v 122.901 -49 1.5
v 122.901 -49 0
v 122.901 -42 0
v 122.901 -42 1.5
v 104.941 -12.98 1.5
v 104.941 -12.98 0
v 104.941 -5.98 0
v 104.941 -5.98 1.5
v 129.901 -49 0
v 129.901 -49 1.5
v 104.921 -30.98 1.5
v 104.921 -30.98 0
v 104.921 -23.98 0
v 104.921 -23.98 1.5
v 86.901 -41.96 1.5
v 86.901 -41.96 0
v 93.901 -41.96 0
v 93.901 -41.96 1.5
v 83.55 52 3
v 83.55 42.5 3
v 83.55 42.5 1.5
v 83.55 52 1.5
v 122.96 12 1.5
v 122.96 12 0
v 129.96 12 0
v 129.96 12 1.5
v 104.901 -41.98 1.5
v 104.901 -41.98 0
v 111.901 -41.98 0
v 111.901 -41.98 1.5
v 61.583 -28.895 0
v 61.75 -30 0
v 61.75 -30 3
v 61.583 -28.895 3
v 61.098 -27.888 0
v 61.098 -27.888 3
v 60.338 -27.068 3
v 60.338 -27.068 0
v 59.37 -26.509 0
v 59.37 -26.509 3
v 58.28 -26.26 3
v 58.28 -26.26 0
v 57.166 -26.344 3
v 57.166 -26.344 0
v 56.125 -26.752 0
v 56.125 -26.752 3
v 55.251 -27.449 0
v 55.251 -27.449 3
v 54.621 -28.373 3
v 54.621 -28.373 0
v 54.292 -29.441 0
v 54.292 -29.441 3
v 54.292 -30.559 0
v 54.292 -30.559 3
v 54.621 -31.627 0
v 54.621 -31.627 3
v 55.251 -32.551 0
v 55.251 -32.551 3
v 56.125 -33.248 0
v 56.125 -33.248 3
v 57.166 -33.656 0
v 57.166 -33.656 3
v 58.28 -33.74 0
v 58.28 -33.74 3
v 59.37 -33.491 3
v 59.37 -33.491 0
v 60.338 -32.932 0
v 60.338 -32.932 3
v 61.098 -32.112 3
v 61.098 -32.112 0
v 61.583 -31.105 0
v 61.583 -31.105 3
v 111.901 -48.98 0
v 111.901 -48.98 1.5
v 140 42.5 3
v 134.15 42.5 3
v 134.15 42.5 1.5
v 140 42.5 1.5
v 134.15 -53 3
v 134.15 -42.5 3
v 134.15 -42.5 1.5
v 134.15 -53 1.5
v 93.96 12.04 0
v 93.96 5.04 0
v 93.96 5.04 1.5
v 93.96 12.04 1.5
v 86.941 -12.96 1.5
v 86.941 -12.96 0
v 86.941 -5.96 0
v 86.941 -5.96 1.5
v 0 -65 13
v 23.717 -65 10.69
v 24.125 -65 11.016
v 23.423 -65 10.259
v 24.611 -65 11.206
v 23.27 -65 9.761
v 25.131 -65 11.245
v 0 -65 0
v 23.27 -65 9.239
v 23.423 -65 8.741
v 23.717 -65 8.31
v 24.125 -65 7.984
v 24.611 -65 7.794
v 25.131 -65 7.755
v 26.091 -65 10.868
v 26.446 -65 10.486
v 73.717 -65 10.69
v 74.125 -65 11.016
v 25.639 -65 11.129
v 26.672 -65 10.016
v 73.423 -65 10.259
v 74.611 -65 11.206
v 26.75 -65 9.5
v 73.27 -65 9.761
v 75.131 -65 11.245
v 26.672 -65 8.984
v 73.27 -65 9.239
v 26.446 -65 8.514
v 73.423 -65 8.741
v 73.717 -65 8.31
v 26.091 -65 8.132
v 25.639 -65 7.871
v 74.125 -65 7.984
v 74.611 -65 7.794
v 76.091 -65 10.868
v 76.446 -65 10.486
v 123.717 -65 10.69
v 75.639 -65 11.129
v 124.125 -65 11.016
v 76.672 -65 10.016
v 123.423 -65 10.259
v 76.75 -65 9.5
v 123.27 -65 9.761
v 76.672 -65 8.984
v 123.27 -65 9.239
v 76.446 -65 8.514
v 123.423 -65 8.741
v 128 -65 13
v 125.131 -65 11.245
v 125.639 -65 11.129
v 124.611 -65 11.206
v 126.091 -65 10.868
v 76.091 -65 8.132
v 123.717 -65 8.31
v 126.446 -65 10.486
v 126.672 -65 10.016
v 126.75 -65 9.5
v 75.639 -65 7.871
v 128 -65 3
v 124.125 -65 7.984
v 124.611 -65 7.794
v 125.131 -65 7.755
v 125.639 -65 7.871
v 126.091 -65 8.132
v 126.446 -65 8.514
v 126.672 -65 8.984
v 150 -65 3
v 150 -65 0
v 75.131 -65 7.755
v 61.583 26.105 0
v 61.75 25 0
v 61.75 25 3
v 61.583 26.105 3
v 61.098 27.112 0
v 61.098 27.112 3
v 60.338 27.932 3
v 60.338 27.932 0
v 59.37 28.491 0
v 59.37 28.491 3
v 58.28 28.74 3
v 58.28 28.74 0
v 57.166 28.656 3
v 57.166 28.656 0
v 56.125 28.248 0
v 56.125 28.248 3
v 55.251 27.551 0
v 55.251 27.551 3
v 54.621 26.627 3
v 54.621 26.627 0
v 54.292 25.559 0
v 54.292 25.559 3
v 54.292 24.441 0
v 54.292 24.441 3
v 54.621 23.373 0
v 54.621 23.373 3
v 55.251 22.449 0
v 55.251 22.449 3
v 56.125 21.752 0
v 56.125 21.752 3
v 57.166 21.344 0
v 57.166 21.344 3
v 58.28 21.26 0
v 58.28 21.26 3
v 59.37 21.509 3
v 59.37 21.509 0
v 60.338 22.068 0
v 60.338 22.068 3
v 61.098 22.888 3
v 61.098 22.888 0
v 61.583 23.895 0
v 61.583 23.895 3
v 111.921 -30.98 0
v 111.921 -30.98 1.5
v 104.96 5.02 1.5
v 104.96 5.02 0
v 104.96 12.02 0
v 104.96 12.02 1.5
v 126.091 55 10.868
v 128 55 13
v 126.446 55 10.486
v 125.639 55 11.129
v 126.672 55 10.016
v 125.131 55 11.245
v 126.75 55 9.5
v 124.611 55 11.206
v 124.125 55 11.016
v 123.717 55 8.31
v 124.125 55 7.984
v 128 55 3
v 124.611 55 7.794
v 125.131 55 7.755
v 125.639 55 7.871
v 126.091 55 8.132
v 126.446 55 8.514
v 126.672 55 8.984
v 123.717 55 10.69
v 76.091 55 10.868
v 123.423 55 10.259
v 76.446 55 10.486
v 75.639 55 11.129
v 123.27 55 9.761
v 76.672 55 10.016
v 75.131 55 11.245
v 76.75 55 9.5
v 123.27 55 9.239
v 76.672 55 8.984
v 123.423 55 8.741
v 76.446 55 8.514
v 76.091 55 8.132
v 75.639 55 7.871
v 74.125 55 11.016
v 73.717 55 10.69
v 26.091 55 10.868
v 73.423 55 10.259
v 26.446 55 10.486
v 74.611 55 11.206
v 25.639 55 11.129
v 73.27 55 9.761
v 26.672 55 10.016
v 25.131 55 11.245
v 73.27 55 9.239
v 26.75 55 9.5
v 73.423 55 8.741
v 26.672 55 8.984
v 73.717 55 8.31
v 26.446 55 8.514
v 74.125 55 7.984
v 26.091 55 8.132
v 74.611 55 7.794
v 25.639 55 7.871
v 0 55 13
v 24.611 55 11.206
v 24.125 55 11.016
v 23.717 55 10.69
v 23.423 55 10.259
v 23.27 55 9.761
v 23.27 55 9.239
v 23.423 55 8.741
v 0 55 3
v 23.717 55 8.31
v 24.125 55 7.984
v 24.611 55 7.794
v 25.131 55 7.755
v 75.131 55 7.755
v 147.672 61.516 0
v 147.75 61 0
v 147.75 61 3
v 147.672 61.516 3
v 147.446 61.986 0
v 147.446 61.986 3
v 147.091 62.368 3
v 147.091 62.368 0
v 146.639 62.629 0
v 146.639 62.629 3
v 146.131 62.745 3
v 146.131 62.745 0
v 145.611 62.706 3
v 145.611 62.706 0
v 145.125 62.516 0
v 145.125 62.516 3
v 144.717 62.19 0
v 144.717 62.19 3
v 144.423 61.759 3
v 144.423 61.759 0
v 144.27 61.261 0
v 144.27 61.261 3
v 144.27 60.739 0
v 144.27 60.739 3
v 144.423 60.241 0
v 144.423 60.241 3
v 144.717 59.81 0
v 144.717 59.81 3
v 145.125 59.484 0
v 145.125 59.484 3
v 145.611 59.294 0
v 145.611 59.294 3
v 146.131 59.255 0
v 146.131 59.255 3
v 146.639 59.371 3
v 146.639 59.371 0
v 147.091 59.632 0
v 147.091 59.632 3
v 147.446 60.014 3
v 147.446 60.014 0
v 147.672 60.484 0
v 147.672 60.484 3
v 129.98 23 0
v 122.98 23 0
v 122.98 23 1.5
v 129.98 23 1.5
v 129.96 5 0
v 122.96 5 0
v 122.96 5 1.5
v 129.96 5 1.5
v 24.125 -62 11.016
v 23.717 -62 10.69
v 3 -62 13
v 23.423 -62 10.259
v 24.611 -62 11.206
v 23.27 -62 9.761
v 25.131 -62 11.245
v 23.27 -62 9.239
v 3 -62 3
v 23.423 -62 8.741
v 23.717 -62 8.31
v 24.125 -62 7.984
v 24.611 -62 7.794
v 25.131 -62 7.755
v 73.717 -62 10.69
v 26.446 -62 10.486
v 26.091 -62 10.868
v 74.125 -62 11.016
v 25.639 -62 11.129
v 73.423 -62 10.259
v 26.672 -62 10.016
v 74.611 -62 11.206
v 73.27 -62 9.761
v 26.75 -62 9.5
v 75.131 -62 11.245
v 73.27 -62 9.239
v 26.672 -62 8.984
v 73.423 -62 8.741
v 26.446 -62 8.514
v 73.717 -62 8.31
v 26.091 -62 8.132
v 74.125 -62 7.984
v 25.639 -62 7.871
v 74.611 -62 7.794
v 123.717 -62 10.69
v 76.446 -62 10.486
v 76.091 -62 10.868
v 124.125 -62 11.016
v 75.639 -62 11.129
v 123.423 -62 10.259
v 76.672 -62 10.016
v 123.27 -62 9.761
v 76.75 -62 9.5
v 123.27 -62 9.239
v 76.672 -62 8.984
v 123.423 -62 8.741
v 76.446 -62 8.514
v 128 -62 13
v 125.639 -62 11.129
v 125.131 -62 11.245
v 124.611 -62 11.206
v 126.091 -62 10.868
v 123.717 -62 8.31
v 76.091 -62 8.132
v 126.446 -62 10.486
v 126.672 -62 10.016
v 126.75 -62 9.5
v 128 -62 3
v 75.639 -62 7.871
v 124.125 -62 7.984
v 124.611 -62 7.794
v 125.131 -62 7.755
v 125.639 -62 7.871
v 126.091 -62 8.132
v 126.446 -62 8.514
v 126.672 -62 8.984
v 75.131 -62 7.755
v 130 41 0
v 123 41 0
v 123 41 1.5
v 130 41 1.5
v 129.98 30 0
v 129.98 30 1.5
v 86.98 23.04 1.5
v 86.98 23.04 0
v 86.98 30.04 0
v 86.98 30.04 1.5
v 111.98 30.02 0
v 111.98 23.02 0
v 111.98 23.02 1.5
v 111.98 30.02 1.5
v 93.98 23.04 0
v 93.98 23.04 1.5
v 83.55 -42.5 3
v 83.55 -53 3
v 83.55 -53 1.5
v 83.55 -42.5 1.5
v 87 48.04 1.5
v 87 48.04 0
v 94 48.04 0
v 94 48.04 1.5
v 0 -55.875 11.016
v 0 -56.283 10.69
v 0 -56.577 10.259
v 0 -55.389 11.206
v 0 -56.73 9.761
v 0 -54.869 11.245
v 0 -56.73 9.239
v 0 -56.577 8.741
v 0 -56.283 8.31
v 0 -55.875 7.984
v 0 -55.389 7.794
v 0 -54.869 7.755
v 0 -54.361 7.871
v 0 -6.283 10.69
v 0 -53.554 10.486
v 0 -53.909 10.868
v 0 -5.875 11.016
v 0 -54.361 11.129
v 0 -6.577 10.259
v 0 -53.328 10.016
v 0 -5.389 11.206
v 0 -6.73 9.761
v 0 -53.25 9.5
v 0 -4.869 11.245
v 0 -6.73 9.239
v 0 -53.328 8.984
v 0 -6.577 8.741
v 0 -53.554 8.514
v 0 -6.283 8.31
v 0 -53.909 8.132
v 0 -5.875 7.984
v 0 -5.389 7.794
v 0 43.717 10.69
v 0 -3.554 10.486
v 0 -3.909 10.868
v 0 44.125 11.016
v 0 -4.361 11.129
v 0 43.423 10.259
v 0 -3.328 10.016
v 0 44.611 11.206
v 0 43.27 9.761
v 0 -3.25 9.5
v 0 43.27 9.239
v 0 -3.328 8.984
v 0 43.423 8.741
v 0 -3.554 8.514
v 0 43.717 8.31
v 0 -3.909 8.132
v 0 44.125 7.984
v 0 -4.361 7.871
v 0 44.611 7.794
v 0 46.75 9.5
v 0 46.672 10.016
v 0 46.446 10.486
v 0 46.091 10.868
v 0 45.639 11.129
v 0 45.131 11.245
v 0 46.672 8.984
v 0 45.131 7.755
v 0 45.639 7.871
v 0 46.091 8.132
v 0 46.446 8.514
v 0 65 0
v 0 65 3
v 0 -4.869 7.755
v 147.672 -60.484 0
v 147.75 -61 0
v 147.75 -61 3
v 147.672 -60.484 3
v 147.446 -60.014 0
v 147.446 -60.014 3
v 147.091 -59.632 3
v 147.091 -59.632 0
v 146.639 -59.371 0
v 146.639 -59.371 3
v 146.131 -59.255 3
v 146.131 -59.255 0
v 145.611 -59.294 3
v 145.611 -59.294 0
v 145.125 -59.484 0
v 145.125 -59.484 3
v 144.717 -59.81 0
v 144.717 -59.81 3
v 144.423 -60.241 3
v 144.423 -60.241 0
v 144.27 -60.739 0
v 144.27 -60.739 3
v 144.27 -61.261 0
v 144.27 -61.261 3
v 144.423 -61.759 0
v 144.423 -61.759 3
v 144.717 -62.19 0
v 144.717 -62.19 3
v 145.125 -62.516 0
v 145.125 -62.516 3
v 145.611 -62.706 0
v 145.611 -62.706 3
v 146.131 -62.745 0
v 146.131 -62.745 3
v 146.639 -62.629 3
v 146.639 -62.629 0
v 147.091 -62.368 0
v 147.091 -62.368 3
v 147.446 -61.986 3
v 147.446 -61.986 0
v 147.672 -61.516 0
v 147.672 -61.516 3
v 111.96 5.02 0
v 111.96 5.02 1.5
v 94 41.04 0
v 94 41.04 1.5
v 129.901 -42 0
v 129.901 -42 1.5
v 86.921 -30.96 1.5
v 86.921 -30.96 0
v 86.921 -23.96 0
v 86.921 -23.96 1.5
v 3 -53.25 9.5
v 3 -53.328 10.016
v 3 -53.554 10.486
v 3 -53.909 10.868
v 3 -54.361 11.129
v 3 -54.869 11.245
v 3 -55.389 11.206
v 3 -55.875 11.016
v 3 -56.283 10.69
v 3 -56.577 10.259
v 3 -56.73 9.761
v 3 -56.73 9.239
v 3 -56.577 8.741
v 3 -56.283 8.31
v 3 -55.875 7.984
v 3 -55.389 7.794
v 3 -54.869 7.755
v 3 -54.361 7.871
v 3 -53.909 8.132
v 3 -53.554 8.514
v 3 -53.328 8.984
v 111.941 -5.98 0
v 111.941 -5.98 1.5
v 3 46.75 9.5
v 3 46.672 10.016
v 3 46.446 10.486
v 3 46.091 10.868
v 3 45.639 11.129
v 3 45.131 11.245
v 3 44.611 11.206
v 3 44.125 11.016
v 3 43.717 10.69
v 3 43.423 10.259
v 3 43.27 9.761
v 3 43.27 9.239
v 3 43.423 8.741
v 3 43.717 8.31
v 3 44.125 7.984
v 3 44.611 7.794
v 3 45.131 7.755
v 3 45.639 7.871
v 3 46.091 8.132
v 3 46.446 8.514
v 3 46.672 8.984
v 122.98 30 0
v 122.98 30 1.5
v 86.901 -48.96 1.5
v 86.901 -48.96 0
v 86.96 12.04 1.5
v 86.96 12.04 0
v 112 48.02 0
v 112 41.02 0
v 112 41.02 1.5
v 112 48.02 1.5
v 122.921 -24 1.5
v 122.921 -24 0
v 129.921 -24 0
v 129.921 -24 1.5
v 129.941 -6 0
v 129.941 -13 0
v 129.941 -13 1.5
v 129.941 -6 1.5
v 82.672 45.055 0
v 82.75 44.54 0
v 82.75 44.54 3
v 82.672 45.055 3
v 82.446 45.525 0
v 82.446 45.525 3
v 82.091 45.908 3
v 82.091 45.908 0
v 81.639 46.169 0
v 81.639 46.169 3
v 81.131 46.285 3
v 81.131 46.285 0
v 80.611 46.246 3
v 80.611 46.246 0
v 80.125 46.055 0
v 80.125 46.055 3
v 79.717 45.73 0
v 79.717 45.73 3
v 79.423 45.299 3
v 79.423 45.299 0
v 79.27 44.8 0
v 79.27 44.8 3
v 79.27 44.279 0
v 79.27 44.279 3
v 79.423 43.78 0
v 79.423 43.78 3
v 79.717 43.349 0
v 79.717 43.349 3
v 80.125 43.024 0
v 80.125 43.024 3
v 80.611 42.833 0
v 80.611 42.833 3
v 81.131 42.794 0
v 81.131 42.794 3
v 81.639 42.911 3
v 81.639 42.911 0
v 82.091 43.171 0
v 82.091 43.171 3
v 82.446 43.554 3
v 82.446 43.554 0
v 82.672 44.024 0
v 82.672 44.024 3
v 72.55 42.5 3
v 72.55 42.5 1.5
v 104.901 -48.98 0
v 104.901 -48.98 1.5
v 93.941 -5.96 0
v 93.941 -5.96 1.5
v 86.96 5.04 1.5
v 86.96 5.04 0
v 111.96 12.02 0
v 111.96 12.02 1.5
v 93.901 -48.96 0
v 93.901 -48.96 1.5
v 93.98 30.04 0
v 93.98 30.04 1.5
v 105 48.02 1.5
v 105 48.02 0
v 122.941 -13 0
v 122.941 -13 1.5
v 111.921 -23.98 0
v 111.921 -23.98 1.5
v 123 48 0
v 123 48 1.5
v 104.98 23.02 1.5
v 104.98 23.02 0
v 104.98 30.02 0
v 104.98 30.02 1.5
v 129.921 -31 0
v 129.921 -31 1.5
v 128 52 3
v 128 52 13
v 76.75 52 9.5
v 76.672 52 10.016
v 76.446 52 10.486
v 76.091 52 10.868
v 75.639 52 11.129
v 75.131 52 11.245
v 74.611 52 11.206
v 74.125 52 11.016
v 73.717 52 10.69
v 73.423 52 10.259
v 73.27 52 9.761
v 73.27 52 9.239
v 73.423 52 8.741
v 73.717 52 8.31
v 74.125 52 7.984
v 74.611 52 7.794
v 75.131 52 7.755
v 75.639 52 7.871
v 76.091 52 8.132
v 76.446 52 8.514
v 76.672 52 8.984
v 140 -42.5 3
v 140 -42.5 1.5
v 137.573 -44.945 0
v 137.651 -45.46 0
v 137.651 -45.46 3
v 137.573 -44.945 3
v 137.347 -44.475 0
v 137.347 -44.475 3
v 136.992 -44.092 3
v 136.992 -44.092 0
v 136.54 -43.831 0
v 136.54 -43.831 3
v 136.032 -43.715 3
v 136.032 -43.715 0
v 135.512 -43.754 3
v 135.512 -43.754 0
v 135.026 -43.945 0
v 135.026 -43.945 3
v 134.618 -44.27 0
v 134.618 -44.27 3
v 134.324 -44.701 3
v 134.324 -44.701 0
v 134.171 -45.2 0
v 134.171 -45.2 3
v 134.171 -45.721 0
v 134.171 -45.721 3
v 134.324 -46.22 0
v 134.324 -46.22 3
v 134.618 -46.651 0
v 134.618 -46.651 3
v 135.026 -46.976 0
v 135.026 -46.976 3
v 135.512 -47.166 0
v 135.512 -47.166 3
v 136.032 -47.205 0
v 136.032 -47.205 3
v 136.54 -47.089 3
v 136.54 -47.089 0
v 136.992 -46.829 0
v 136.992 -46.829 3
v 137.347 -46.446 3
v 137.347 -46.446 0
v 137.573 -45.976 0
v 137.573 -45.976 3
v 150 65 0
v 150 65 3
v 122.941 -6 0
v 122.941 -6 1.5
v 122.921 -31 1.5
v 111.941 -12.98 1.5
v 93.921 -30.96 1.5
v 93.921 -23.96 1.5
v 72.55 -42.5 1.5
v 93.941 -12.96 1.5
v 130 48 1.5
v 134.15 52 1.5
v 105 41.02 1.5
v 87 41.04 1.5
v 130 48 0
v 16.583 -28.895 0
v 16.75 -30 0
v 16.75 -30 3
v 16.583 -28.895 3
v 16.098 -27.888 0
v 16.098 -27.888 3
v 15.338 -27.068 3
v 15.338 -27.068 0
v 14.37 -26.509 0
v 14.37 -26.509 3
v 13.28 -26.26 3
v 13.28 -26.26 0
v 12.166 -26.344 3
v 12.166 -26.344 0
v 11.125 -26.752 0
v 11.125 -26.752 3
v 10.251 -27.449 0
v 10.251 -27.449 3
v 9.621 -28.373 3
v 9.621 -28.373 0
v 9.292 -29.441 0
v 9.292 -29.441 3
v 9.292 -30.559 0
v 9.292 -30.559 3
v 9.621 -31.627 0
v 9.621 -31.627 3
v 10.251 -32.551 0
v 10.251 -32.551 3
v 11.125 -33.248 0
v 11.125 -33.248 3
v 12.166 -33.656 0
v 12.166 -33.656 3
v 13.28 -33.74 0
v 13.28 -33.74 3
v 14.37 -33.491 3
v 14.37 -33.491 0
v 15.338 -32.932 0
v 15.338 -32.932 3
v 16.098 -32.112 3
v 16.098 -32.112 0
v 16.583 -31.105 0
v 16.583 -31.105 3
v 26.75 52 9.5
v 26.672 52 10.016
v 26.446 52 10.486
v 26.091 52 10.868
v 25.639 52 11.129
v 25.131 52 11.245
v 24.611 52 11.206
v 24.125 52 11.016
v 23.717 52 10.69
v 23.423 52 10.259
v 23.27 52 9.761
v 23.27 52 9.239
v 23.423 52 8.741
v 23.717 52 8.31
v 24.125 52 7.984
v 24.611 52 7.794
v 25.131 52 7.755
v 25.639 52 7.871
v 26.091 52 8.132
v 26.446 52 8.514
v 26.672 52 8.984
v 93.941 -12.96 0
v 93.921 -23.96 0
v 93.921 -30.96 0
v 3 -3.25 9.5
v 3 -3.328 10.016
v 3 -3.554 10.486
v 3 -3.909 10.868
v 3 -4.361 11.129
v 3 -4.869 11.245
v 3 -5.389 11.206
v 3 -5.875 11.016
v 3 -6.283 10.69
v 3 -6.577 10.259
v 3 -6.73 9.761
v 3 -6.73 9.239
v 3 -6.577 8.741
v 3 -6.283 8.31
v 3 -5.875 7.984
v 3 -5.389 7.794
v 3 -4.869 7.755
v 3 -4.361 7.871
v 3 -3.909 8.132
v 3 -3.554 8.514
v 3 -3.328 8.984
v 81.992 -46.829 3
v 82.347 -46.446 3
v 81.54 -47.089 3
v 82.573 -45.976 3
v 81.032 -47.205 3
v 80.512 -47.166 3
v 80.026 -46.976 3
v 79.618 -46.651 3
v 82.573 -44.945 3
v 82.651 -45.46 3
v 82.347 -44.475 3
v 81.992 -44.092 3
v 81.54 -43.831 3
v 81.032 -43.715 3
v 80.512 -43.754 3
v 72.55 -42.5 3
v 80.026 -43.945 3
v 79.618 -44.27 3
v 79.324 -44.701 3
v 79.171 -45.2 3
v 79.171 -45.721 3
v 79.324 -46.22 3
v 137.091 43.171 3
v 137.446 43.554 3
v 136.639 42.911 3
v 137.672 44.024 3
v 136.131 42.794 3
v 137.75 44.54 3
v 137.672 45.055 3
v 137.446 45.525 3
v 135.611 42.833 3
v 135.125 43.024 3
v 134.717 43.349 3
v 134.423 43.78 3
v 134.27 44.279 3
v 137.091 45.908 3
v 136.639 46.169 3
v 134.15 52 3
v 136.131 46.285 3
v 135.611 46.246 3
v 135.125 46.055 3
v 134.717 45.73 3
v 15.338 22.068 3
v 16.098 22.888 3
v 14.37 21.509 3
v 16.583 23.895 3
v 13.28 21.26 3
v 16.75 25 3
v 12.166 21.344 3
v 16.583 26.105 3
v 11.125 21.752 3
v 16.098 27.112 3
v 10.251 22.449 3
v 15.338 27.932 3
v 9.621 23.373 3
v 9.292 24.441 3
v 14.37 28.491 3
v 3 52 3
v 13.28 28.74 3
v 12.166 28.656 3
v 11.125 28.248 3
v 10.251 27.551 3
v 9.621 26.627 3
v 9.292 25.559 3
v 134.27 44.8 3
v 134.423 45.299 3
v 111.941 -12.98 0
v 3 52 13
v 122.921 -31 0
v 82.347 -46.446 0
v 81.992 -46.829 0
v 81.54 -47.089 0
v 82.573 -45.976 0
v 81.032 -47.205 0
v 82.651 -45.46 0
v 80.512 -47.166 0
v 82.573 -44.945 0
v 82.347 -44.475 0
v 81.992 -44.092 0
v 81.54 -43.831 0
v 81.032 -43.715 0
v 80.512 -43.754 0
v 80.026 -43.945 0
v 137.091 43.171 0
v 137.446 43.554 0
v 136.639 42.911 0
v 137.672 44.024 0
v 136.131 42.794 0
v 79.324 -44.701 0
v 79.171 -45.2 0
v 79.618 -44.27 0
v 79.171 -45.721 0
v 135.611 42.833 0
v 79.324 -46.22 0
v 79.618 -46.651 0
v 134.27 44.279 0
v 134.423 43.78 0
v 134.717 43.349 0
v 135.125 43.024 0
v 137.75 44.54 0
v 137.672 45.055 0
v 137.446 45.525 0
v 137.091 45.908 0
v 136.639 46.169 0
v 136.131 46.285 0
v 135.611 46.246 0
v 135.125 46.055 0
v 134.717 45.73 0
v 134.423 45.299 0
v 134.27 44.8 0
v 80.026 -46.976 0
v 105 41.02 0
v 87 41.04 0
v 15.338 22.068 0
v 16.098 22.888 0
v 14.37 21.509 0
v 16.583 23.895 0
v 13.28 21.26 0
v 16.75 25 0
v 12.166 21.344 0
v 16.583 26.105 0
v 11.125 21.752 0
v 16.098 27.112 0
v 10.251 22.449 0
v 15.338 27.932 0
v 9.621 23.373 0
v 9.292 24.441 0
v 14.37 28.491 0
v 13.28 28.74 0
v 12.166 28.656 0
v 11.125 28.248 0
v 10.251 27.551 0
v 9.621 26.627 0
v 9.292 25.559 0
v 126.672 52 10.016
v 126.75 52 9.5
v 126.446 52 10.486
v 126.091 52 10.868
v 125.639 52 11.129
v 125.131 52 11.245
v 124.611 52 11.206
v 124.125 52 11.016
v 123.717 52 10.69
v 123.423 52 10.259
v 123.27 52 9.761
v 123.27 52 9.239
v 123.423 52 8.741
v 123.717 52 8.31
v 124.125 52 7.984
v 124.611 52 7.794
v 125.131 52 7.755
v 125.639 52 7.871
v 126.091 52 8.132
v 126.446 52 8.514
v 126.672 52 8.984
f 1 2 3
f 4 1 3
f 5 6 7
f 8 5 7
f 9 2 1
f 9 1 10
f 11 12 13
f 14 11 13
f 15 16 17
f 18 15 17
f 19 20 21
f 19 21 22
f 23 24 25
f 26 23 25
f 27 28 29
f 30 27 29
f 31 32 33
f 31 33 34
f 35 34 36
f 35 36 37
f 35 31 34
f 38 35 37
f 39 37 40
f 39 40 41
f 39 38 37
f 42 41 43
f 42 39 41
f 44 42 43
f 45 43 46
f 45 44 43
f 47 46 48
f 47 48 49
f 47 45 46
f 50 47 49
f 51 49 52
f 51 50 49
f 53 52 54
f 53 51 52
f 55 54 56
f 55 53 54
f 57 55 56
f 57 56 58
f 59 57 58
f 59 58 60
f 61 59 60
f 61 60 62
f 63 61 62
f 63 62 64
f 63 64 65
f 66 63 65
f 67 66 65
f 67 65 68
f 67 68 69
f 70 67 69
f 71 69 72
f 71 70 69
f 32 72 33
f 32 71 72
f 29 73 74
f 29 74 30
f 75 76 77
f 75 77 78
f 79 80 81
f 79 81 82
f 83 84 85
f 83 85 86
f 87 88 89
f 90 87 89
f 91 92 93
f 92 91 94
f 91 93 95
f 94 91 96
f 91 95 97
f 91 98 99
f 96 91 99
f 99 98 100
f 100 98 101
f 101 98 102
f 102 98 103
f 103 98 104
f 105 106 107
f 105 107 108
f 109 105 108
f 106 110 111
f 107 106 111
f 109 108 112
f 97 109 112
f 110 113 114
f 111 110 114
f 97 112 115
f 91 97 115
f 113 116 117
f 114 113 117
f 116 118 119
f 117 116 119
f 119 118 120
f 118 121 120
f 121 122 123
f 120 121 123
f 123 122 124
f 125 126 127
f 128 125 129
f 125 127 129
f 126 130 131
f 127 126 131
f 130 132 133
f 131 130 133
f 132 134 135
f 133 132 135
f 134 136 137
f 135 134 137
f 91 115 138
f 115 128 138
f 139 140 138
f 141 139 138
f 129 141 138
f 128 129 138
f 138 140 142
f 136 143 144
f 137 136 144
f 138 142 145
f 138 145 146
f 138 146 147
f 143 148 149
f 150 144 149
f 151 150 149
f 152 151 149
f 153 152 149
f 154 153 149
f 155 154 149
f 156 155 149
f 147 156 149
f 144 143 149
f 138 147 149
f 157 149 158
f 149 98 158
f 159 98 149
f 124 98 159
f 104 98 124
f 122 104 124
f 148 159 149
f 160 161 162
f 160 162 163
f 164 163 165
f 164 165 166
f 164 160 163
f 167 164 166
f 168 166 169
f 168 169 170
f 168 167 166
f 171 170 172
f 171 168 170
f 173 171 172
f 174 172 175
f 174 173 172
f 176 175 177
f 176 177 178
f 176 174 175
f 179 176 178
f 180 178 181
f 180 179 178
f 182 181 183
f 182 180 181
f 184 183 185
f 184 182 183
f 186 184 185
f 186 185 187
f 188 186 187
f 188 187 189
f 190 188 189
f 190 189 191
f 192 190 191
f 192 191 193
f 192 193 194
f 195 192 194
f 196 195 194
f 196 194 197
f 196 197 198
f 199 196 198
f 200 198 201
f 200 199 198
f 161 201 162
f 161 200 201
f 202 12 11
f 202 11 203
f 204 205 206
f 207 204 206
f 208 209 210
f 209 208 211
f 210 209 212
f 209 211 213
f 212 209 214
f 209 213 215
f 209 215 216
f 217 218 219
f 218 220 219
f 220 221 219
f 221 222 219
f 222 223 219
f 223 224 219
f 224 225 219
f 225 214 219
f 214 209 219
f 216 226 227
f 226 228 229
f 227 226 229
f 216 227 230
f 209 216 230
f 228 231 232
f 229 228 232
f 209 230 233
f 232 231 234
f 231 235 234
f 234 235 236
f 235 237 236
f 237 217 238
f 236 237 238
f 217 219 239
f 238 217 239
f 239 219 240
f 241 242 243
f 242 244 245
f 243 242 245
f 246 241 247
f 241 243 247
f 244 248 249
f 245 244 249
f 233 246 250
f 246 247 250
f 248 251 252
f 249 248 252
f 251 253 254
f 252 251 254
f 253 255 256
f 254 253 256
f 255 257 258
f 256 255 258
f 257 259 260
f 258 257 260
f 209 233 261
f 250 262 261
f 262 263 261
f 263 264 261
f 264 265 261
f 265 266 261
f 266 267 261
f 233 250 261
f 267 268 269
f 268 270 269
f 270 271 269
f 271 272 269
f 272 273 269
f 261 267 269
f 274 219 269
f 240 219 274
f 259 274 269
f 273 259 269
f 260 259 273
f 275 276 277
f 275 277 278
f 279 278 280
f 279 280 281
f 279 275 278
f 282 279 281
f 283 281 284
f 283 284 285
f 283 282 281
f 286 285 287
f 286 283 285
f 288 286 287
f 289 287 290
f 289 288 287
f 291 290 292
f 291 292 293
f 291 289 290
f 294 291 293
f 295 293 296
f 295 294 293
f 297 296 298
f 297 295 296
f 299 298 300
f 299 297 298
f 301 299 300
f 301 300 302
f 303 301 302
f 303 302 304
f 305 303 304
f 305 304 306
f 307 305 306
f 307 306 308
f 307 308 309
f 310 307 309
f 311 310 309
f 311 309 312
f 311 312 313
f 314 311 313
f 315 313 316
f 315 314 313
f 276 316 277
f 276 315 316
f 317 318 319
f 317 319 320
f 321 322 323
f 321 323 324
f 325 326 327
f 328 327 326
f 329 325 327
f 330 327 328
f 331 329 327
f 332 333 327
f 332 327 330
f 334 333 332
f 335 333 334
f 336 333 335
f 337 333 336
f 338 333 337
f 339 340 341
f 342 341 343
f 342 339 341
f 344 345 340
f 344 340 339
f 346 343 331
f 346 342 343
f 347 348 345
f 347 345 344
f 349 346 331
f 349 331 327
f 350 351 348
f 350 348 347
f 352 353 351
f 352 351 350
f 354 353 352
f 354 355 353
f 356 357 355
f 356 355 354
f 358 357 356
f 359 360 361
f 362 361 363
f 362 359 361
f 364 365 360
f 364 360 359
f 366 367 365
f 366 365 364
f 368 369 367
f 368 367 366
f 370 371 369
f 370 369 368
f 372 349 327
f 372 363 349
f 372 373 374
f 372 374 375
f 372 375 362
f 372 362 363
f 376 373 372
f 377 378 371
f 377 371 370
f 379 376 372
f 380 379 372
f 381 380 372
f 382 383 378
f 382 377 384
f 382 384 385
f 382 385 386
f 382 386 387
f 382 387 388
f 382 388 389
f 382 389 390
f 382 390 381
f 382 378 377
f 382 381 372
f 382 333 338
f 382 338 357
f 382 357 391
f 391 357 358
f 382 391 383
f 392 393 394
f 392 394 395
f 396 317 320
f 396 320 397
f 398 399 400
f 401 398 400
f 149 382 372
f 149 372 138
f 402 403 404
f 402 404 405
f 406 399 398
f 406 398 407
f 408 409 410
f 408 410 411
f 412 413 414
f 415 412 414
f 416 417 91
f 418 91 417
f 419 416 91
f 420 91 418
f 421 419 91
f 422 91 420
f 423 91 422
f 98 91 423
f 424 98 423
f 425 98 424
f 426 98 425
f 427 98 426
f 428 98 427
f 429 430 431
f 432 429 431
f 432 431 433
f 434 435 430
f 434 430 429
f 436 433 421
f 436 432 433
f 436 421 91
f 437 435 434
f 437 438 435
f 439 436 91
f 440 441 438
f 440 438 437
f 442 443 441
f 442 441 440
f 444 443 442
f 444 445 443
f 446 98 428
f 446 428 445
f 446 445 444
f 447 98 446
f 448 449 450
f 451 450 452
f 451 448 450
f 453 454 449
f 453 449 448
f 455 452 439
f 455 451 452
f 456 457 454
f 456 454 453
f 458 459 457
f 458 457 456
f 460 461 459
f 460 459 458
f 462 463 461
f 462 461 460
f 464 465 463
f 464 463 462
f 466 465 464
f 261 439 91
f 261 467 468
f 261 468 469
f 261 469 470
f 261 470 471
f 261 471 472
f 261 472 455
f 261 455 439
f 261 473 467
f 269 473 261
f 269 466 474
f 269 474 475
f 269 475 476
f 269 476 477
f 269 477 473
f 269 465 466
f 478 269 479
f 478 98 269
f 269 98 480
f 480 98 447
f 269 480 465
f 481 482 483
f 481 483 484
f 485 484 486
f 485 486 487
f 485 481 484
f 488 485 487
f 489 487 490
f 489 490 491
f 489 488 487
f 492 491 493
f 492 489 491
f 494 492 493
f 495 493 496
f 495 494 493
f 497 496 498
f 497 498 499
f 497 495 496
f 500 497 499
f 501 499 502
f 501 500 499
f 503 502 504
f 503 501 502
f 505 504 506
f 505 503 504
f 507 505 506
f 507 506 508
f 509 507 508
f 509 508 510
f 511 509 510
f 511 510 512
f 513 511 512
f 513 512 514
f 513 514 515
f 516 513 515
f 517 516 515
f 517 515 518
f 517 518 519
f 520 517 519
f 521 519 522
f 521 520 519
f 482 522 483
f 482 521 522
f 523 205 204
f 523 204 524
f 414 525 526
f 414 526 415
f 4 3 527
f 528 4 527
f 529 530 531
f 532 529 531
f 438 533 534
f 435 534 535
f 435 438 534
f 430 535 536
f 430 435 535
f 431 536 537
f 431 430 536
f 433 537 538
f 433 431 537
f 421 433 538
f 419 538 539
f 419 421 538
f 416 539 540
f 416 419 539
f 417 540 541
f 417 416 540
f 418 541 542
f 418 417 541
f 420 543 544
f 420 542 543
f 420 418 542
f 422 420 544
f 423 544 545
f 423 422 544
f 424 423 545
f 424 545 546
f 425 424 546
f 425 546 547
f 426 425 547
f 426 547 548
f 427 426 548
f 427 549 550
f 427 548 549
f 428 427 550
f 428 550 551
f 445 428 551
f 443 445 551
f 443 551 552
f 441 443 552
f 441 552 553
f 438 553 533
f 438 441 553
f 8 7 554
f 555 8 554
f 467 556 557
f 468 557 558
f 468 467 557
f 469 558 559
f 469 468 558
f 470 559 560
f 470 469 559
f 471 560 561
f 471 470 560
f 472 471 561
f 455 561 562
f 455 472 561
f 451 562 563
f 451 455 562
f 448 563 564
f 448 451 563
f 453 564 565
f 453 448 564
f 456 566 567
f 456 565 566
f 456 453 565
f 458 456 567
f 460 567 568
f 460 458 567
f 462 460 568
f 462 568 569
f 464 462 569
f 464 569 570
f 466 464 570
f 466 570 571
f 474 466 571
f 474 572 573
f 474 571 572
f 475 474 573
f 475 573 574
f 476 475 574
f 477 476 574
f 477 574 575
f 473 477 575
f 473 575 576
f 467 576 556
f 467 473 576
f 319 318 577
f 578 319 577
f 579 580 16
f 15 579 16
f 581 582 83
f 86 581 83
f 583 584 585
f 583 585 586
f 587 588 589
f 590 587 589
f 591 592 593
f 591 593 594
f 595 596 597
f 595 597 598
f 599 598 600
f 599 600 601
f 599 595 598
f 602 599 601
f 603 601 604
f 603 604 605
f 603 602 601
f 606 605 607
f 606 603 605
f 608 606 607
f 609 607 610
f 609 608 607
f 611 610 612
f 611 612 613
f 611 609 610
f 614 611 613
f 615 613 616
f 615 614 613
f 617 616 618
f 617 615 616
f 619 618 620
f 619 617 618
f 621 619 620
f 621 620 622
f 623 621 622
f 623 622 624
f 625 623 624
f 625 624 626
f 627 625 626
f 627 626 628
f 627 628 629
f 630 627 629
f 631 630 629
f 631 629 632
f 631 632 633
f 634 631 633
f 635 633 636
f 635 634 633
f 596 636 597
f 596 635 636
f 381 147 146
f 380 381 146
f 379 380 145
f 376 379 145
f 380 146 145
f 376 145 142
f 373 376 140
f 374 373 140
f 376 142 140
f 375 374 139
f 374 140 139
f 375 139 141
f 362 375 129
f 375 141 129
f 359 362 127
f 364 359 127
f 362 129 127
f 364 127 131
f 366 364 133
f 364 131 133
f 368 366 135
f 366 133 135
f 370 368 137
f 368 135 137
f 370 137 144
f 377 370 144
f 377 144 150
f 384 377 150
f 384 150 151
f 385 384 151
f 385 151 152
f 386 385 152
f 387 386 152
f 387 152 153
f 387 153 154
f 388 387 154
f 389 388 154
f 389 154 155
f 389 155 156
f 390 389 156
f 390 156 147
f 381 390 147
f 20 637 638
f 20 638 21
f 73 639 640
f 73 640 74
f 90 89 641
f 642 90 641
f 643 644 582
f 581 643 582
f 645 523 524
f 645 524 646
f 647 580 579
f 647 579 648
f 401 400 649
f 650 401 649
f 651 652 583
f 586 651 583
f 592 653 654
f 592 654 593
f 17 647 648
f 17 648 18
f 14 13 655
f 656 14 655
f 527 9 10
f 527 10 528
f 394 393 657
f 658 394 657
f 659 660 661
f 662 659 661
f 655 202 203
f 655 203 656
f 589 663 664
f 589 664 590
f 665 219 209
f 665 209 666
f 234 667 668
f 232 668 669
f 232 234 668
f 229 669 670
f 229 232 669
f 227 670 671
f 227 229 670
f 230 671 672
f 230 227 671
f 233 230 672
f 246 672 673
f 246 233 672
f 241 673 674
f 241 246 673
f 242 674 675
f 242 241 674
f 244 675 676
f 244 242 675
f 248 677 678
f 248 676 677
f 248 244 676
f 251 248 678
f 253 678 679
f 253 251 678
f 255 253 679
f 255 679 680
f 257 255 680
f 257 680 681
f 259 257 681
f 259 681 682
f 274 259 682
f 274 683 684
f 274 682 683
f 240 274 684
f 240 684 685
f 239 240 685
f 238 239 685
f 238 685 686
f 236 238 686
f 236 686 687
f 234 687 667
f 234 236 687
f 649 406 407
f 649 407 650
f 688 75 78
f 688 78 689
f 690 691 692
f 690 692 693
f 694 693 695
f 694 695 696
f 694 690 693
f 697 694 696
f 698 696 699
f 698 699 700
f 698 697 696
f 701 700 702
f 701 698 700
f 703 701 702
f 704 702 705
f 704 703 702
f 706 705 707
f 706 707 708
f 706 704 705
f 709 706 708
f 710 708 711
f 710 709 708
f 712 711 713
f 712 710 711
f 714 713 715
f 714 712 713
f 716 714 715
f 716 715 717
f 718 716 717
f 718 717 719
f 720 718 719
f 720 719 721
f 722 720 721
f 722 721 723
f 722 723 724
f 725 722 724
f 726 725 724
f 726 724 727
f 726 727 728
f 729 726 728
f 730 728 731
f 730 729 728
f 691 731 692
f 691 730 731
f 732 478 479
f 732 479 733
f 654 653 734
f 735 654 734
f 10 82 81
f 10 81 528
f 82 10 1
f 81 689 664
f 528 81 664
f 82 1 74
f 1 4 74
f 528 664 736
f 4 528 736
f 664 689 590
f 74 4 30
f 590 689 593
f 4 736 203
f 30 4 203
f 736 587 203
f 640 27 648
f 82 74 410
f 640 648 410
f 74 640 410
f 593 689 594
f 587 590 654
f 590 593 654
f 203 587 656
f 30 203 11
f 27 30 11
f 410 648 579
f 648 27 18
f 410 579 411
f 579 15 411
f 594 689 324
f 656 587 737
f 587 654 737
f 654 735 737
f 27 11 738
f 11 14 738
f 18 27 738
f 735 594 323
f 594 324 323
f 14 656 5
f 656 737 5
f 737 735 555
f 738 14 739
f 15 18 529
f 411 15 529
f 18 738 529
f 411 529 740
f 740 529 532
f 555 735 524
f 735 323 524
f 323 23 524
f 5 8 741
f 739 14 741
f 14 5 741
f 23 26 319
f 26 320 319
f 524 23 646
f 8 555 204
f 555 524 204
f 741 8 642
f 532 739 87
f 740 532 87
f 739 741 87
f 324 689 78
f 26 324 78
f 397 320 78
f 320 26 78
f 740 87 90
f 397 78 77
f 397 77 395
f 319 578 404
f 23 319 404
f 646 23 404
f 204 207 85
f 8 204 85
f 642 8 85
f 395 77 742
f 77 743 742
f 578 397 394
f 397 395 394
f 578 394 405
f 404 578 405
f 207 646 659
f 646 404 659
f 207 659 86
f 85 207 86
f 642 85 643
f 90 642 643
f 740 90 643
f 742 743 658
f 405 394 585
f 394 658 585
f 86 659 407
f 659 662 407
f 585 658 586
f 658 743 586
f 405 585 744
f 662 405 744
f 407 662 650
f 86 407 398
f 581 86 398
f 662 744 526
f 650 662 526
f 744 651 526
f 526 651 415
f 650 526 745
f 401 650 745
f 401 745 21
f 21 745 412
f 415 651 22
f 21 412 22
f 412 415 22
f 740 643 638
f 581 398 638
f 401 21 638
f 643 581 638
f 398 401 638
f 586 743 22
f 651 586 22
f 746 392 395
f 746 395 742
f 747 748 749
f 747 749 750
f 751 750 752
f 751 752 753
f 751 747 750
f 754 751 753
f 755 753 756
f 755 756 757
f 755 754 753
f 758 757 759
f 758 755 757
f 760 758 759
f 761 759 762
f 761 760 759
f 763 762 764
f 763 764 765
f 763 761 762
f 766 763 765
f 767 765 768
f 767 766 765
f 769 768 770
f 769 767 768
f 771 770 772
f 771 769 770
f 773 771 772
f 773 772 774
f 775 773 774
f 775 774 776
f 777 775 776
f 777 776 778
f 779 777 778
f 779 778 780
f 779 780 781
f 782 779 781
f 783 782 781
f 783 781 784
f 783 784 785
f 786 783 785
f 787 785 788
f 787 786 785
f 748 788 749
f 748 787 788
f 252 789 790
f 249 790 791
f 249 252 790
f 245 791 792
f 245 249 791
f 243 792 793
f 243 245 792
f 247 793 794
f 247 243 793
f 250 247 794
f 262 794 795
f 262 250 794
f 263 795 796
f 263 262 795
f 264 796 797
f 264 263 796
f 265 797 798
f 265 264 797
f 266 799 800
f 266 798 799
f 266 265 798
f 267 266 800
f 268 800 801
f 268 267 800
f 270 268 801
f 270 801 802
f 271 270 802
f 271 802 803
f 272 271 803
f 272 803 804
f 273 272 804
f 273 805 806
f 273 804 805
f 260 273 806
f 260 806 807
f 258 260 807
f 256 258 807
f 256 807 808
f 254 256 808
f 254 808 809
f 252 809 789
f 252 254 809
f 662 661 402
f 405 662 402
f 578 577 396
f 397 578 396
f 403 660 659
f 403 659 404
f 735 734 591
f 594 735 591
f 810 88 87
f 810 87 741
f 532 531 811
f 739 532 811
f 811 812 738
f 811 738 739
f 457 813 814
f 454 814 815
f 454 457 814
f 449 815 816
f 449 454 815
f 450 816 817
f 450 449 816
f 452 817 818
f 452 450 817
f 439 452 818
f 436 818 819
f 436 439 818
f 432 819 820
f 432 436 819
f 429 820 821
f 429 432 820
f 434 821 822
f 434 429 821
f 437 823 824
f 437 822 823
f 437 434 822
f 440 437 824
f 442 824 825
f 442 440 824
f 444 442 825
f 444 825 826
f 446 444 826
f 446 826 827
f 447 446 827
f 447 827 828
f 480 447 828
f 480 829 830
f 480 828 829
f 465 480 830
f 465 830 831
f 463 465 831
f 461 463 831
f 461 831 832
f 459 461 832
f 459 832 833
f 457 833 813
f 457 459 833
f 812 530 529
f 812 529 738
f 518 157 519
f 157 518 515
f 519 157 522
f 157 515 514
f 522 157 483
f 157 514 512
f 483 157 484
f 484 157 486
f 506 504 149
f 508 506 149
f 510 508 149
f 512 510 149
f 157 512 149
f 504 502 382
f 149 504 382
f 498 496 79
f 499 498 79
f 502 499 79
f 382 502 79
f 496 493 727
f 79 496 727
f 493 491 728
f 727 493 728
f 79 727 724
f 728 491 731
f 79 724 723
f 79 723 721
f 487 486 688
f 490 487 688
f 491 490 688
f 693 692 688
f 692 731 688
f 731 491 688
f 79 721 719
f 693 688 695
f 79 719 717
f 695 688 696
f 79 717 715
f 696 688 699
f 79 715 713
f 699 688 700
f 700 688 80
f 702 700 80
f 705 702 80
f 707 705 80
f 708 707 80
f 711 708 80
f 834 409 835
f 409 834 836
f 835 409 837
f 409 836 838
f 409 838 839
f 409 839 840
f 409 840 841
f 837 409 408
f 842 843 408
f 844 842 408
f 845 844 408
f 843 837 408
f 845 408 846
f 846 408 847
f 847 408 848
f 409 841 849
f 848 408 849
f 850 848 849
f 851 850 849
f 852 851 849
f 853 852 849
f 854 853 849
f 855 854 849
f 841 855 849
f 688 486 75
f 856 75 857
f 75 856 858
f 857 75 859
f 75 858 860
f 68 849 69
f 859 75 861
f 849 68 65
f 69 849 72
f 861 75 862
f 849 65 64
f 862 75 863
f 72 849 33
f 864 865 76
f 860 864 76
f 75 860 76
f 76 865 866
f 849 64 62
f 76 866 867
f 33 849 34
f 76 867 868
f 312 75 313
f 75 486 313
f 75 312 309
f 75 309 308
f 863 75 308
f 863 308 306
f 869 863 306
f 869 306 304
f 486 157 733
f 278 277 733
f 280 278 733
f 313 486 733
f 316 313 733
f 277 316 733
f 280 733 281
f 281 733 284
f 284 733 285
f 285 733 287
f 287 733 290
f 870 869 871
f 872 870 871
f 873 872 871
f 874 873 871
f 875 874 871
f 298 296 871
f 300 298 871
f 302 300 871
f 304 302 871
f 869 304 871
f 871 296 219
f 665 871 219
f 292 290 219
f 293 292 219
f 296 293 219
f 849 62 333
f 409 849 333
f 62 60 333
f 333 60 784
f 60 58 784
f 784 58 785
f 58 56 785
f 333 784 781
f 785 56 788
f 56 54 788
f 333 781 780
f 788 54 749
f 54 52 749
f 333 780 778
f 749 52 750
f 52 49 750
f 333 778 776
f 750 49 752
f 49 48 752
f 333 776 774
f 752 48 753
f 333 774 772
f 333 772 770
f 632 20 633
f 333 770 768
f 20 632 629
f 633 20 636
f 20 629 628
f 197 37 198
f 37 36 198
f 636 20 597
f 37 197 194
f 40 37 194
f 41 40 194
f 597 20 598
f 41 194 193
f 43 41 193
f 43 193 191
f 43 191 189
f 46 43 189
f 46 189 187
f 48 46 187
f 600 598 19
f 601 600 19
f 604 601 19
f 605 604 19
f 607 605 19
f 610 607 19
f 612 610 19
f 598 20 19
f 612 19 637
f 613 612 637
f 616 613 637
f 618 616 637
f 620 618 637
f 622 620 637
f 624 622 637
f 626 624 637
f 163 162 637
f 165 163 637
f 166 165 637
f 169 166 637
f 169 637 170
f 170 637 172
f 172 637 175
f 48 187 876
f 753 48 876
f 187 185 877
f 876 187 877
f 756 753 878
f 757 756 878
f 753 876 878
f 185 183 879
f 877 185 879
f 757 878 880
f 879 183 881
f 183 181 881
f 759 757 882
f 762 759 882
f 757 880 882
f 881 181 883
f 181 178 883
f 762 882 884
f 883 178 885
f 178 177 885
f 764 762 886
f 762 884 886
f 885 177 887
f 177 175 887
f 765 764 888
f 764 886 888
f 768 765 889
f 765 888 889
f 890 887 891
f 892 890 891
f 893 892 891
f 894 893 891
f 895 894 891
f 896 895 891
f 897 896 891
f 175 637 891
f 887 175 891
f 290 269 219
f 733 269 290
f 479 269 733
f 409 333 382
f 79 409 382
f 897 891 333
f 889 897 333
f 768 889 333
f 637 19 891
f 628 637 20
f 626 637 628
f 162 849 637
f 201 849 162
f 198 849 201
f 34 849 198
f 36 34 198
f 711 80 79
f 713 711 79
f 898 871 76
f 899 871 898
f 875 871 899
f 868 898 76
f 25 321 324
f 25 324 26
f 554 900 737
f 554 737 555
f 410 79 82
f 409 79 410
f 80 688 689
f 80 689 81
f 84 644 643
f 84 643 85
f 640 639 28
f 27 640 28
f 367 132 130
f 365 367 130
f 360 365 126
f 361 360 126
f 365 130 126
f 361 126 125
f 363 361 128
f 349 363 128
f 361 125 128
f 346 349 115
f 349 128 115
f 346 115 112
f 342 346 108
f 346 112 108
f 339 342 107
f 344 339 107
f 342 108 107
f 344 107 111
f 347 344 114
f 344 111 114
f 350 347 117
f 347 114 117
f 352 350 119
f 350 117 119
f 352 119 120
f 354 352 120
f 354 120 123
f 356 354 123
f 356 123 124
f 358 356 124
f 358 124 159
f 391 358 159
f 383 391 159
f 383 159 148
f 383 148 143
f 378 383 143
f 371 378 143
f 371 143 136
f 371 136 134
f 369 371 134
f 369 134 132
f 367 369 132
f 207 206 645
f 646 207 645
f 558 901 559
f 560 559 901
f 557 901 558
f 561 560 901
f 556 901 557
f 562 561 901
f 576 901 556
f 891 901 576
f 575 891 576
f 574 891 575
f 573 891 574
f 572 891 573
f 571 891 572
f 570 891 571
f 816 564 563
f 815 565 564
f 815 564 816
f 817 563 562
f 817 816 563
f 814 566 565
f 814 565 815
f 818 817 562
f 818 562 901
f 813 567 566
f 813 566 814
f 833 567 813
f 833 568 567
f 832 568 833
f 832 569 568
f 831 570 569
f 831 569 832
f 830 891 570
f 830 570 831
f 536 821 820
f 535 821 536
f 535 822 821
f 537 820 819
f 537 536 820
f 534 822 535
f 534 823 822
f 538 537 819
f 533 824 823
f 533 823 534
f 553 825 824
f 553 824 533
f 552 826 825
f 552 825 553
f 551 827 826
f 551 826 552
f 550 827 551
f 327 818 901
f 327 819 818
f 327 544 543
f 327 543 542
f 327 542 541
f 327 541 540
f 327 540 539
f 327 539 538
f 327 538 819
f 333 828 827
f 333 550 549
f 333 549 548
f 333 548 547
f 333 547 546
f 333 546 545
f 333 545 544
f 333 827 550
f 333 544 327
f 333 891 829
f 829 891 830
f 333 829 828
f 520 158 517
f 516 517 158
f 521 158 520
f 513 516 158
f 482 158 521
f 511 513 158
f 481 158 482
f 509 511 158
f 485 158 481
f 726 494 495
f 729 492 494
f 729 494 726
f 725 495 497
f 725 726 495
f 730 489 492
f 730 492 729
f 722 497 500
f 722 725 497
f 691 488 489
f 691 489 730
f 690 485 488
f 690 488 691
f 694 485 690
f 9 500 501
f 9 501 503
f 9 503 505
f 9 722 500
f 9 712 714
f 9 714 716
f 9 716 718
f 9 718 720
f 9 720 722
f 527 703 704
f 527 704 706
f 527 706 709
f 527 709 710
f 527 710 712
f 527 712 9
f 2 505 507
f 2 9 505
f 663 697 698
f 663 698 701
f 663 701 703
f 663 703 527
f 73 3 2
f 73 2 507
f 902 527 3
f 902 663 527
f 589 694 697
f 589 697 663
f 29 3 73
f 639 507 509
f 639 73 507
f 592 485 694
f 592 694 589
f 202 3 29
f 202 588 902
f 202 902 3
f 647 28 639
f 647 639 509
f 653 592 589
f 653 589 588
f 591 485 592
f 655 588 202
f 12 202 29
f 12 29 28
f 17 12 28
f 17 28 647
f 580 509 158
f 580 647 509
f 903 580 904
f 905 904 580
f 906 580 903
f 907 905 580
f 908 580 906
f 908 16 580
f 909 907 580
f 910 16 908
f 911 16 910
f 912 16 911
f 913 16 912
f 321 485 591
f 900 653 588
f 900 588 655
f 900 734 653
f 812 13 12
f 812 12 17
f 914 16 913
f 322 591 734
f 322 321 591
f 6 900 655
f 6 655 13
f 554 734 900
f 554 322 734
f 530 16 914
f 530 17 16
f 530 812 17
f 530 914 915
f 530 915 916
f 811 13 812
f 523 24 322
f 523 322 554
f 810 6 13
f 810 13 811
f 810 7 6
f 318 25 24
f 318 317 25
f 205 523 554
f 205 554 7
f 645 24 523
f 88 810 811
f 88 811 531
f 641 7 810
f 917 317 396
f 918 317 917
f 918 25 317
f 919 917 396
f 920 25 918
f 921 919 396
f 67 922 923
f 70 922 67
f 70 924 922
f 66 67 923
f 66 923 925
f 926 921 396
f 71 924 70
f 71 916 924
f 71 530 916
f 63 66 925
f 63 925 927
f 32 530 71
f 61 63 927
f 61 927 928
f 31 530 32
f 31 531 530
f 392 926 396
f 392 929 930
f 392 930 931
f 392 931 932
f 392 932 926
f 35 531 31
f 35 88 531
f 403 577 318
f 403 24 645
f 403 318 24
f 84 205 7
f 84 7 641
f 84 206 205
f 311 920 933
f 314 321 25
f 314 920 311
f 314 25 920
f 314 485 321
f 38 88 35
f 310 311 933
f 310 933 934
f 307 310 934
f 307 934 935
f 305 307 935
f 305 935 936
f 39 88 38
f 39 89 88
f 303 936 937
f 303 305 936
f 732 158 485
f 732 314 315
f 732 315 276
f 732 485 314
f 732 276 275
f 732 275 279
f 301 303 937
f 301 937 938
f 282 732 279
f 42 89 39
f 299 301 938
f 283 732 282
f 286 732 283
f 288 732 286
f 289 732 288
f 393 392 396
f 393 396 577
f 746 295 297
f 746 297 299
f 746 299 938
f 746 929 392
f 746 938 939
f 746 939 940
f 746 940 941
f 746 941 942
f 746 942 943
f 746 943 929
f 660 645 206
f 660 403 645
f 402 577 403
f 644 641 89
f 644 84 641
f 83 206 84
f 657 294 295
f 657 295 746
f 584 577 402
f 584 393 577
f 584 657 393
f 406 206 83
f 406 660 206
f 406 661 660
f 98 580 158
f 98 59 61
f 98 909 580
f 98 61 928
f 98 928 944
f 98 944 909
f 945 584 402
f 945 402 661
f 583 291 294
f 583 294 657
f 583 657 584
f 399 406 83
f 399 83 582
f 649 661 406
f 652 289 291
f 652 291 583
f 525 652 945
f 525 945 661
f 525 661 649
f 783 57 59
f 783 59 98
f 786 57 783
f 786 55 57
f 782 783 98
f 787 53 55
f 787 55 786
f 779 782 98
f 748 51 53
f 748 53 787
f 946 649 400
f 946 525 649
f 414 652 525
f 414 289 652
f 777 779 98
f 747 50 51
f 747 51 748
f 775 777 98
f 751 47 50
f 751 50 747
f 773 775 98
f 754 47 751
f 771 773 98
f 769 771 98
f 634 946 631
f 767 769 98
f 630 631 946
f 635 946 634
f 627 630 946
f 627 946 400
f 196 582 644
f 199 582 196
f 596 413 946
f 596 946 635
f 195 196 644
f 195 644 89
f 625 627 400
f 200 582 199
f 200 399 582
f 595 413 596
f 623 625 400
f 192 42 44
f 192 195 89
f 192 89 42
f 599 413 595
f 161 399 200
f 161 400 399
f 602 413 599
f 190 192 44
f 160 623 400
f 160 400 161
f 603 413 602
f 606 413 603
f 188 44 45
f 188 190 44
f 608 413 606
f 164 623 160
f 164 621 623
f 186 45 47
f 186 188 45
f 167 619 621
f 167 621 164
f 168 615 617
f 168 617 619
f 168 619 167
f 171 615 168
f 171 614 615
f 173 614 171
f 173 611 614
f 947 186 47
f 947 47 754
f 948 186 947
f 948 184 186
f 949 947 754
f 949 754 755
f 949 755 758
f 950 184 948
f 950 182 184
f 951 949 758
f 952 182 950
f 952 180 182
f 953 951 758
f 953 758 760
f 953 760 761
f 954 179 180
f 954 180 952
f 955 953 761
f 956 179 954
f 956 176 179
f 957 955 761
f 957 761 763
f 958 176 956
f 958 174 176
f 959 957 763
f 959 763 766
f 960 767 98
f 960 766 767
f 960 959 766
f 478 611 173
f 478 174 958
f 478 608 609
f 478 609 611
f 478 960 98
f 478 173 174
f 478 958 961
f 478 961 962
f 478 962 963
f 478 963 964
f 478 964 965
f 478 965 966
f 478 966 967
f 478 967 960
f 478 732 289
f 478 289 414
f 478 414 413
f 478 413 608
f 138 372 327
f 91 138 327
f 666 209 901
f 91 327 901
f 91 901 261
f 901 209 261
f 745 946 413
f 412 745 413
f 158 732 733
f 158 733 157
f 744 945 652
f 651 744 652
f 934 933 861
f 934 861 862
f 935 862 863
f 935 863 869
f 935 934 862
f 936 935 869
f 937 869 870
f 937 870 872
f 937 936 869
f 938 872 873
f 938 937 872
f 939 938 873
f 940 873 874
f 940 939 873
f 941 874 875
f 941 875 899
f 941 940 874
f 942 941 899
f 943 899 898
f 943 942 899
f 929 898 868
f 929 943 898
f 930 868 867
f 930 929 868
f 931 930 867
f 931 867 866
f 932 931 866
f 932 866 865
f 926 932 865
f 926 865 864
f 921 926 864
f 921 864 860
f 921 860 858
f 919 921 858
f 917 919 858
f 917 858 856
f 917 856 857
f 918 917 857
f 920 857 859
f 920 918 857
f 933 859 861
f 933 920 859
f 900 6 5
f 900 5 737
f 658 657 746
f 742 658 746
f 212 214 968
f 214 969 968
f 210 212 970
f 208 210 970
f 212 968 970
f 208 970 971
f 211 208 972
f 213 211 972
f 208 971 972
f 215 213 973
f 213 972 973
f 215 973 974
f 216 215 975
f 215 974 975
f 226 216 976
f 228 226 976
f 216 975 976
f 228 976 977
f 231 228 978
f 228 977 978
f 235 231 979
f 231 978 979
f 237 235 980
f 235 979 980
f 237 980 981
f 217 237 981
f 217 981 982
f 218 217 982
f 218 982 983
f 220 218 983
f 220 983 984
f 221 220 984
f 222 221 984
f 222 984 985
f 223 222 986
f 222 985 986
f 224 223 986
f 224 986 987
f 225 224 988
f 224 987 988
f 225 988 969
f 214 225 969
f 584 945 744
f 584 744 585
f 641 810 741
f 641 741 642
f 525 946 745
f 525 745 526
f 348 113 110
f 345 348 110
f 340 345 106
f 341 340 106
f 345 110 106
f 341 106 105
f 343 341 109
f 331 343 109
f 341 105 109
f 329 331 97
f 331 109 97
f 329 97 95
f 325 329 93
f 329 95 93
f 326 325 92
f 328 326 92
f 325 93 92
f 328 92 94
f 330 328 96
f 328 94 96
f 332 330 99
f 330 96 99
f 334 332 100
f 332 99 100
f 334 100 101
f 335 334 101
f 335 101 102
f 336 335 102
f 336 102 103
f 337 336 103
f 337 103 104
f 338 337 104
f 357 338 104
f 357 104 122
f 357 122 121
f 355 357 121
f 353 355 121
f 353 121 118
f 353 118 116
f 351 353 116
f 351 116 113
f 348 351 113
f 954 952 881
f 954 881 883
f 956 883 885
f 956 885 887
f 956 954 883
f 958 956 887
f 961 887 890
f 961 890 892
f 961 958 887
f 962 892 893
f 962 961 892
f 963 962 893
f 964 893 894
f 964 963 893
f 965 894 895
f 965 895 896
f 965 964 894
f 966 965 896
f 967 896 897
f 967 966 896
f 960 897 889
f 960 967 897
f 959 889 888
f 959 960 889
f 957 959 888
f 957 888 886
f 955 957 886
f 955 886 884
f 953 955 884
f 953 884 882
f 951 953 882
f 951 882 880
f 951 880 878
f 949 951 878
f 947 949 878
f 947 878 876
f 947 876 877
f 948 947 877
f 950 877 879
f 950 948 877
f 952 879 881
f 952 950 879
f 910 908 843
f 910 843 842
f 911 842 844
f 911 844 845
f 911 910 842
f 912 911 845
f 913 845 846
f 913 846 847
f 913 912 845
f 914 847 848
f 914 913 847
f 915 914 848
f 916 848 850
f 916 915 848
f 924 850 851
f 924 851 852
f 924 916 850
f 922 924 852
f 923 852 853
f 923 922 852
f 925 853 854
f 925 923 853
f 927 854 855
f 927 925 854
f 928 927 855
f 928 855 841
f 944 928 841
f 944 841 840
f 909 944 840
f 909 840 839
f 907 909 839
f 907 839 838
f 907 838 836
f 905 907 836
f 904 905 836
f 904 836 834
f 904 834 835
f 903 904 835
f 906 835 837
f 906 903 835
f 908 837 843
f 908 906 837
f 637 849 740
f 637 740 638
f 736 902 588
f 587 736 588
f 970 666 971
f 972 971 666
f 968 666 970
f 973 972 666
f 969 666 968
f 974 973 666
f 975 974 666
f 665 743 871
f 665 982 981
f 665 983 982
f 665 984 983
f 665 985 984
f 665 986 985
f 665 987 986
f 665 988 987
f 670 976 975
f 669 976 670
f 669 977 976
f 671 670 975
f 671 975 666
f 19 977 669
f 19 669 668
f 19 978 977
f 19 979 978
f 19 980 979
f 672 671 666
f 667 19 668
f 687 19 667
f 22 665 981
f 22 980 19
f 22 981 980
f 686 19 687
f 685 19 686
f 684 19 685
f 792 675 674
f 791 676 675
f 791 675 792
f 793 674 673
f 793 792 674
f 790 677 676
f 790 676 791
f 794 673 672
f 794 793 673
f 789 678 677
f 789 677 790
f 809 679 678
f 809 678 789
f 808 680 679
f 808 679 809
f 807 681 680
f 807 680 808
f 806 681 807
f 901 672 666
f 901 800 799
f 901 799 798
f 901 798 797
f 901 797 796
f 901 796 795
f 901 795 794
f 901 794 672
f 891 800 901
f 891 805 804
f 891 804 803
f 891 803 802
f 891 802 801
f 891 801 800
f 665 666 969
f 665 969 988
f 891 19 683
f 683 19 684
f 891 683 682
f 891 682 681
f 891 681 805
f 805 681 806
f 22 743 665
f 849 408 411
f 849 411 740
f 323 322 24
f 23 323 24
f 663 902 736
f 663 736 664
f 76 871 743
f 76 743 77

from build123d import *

# Parameters (mm, degrees)
SKETCH013_R     = 3.75
SKETCH013_R_2   = 1.75
SKETCH013_W     = 7
SKETCH013_H     = 7
PAD004_DEPTH    = 3
PAD_DEPTH       = 10
SKETCH015_R     = 1.75
POCKET005_DEPTH = 5
SKETCH004_R     = 1.75
POCKET006_DEPTH = 5
SKETCH014_R     = 1.75
POCKET007_DEPTH = 5
POCKET_DEPTH    = 2


with BuildPart() as part:
    # Sketch013 → Pad004 (new body)
    with BuildSketch(Plane.XY):
        Polygon((0, 65), (150, 65.000002), (150, -65), (0, -65), align=None)
        with Locations((13, 25)):
            Circle(SKETCH013_R, mode=Mode.SUBTRACT)
        with Locations((58, 25)):
            Circle(SKETCH013_R, mode=Mode.SUBTRACT)
        with Locations((13, -30)):
            Circle(SKETCH013_R, mode=Mode.SUBTRACT)
        with Locations((58, -30)):
            Circle(SKETCH013_R, mode=Mode.SUBTRACT)
        with Locations((146, 61.000002)):
            Circle(SKETCH013_R_2, mode=Mode.SUBTRACT)
        with Locations((146, -61)):
            Circle(SKETCH013_R_2, mode=Mode.SUBTRACT)
        with Locations((81.000022, 44.539576)):
            Circle(SKETCH013_R_2, mode=Mode.SUBTRACT)
        with Locations((136, 44.539576)):
            Circle(SKETCH013_R_2, mode=Mode.SUBTRACT)
        with Locations((80.901087, -45.46037)):
            Circle(SKETCH013_R_2, mode=Mode.SUBTRACT)
        with Locations((135.901066, -45.46037)):
            Circle(SKETCH013_R_2, mode=Mode.SUBTRACT)
        with Locations((90.500022, 44.539576)):
            Rectangle(SKETCH013_W, SKETCH013_H, mode=Mode.SUBTRACT)
        with Locations((108.500011, 44.519789)):
            Rectangle(SKETCH013_W, SKETCH013_H, mode=Mode.SUBTRACT)
        with Locations((126.5, 44.500002)):
            Rectangle(SKETCH013_W, SKETCH013_H, mode=Mode.SUBTRACT)
        with Locations((90.480235, 26.539587)):
            Rectangle(SKETCH013_W, SKETCH013_H, mode=Mode.SUBTRACT)
        with Locations((108.480224, 26.5198)):
            Rectangle(SKETCH013_W, SKETCH013_H, mode=Mode.SUBTRACT)
        with Locations((126.480213, 26.500013)):
            Rectangle(SKETCH013_W, SKETCH013_H, mode=Mode.SUBTRACT)
        with Locations((90.460448, 8.539598)):
            Rectangle(SKETCH013_W, SKETCH013_H, mode=Mode.SUBTRACT)
        with Locations((108.460437, 8.519811)):
            Rectangle(SKETCH013_W, SKETCH013_H, mode=Mode.SUBTRACT)
        with Locations((126.460426, 8.500024)):
            Rectangle(SKETCH013_W, SKETCH013_H, mode=Mode.SUBTRACT)
        with Locations((90.440661, -9.460392)):
            Rectangle(SKETCH013_W, SKETCH013_H, mode=Mode.SUBTRACT)
        with Locations((108.44065, -9.480178)):
            Rectangle(SKETCH013_W, SKETCH013_H, mode=Mode.SUBTRACT)
        with Locations((126.440639, -9.499965)):
            Rectangle(SKETCH013_W, SKETCH013_H, mode=Mode.SUBTRACT)
        with Locations((90.420874, -27.460381)):
            Rectangle(SKETCH013_W, SKETCH013_H, mode=Mode.SUBTRACT)
        with Locations((108.420863, -27.480168)):
            Rectangle(SKETCH013_W, SKETCH013_H, mode=Mode.SUBTRACT)
        with Locations((126.420852, -27.499954)):
            Rectangle(SKETCH013_W, SKETCH013_H, mode=Mode.SUBTRACT)
        with Locations((90.401087, -45.46037)):
            Rectangle(SKETCH013_W, SKETCH013_H, mode=Mode.SUBTRACT)
        with Locations((108.401076, -45.480157)):
            Rectangle(SKETCH013_W, SKETCH013_H, mode=Mode.SUBTRACT)
        with Locations((126.401066, -45.499944)):
            Rectangle(SKETCH013_W, SKETCH013_H, mode=Mode.SUBTRACT)
    extrude(amount=PAD004_DEPTH)

    # Sketch001 (on DatumPlane) → Pad (join)
    with BuildSketch(Plane.XY.offset(3)):
        Polygon((0, 55), (3, 55), (128, 55), (128, 52), (3, 52), (3, -62), (128, -62), (128, -65), (3, -65), (0, -65), align=None)
    extrude(amount=PAD_DEPTH)

    # Sketch015 → Pocket005 (cut)
    with BuildSketch(Plane.XZ.offset(65)):
        with Locations((25, 9.5)):
            Circle(SKETCH015_R)
        with Locations((75, 9.5)):
            Circle(SKETCH015_R)
        with Locations((125, 9.5)):
            Circle(SKETCH015_R)
    extrude(amount=-POCKET005_DEPTH, mode=Mode.SUBTRACT)

    # Sketch004 (on DatumPlane) → Pocket006 (cut, symmetric)
    with BuildSketch(Plane.XZ.offset(-55)):
        with Locations((25, 9.5)):
            Circle(SKETCH004_R)
        with Locations((75, 9.5)):
            Circle(SKETCH004_R)
        with Locations((125, 9.5)):
            Circle(SKETCH004_R)
    extrude(amount=POCKET006_DEPTH, both=True, mode=Mode.SUBTRACT)

    # Sketch014 → Pocket007 (cut)
    with BuildSketch(Plane.YZ):
        with Locations((45, 9.5)):
            Circle(SKETCH014_R)
        with Locations((-5, 9.5)):
            Circle(SKETCH014_R)
        with Locations((-55, 9.5)):
            Circle(SKETCH014_R)
    extrude(amount=POCKET007_DEPTH, mode=Mode.SUBTRACT)

    # Sketch → Pocket (cut)
    with BuildSketch(Plane.XY.offset(3.5)):
        Polygon((83.55, 52), (134.15, 52), (134.15, 42.5), (140, 42.5), (140, -42.5), (134.15, -42.5), (134.15, -53), (83.55, -53), (83.55, -42.5), (72.55, -42.5), (72.55, 42.5), (83.55, 42.5), align=None)
    extrude(amount=-POCKET_DEPTH, mode=Mode.SUBTRACT)


solid = part.part
